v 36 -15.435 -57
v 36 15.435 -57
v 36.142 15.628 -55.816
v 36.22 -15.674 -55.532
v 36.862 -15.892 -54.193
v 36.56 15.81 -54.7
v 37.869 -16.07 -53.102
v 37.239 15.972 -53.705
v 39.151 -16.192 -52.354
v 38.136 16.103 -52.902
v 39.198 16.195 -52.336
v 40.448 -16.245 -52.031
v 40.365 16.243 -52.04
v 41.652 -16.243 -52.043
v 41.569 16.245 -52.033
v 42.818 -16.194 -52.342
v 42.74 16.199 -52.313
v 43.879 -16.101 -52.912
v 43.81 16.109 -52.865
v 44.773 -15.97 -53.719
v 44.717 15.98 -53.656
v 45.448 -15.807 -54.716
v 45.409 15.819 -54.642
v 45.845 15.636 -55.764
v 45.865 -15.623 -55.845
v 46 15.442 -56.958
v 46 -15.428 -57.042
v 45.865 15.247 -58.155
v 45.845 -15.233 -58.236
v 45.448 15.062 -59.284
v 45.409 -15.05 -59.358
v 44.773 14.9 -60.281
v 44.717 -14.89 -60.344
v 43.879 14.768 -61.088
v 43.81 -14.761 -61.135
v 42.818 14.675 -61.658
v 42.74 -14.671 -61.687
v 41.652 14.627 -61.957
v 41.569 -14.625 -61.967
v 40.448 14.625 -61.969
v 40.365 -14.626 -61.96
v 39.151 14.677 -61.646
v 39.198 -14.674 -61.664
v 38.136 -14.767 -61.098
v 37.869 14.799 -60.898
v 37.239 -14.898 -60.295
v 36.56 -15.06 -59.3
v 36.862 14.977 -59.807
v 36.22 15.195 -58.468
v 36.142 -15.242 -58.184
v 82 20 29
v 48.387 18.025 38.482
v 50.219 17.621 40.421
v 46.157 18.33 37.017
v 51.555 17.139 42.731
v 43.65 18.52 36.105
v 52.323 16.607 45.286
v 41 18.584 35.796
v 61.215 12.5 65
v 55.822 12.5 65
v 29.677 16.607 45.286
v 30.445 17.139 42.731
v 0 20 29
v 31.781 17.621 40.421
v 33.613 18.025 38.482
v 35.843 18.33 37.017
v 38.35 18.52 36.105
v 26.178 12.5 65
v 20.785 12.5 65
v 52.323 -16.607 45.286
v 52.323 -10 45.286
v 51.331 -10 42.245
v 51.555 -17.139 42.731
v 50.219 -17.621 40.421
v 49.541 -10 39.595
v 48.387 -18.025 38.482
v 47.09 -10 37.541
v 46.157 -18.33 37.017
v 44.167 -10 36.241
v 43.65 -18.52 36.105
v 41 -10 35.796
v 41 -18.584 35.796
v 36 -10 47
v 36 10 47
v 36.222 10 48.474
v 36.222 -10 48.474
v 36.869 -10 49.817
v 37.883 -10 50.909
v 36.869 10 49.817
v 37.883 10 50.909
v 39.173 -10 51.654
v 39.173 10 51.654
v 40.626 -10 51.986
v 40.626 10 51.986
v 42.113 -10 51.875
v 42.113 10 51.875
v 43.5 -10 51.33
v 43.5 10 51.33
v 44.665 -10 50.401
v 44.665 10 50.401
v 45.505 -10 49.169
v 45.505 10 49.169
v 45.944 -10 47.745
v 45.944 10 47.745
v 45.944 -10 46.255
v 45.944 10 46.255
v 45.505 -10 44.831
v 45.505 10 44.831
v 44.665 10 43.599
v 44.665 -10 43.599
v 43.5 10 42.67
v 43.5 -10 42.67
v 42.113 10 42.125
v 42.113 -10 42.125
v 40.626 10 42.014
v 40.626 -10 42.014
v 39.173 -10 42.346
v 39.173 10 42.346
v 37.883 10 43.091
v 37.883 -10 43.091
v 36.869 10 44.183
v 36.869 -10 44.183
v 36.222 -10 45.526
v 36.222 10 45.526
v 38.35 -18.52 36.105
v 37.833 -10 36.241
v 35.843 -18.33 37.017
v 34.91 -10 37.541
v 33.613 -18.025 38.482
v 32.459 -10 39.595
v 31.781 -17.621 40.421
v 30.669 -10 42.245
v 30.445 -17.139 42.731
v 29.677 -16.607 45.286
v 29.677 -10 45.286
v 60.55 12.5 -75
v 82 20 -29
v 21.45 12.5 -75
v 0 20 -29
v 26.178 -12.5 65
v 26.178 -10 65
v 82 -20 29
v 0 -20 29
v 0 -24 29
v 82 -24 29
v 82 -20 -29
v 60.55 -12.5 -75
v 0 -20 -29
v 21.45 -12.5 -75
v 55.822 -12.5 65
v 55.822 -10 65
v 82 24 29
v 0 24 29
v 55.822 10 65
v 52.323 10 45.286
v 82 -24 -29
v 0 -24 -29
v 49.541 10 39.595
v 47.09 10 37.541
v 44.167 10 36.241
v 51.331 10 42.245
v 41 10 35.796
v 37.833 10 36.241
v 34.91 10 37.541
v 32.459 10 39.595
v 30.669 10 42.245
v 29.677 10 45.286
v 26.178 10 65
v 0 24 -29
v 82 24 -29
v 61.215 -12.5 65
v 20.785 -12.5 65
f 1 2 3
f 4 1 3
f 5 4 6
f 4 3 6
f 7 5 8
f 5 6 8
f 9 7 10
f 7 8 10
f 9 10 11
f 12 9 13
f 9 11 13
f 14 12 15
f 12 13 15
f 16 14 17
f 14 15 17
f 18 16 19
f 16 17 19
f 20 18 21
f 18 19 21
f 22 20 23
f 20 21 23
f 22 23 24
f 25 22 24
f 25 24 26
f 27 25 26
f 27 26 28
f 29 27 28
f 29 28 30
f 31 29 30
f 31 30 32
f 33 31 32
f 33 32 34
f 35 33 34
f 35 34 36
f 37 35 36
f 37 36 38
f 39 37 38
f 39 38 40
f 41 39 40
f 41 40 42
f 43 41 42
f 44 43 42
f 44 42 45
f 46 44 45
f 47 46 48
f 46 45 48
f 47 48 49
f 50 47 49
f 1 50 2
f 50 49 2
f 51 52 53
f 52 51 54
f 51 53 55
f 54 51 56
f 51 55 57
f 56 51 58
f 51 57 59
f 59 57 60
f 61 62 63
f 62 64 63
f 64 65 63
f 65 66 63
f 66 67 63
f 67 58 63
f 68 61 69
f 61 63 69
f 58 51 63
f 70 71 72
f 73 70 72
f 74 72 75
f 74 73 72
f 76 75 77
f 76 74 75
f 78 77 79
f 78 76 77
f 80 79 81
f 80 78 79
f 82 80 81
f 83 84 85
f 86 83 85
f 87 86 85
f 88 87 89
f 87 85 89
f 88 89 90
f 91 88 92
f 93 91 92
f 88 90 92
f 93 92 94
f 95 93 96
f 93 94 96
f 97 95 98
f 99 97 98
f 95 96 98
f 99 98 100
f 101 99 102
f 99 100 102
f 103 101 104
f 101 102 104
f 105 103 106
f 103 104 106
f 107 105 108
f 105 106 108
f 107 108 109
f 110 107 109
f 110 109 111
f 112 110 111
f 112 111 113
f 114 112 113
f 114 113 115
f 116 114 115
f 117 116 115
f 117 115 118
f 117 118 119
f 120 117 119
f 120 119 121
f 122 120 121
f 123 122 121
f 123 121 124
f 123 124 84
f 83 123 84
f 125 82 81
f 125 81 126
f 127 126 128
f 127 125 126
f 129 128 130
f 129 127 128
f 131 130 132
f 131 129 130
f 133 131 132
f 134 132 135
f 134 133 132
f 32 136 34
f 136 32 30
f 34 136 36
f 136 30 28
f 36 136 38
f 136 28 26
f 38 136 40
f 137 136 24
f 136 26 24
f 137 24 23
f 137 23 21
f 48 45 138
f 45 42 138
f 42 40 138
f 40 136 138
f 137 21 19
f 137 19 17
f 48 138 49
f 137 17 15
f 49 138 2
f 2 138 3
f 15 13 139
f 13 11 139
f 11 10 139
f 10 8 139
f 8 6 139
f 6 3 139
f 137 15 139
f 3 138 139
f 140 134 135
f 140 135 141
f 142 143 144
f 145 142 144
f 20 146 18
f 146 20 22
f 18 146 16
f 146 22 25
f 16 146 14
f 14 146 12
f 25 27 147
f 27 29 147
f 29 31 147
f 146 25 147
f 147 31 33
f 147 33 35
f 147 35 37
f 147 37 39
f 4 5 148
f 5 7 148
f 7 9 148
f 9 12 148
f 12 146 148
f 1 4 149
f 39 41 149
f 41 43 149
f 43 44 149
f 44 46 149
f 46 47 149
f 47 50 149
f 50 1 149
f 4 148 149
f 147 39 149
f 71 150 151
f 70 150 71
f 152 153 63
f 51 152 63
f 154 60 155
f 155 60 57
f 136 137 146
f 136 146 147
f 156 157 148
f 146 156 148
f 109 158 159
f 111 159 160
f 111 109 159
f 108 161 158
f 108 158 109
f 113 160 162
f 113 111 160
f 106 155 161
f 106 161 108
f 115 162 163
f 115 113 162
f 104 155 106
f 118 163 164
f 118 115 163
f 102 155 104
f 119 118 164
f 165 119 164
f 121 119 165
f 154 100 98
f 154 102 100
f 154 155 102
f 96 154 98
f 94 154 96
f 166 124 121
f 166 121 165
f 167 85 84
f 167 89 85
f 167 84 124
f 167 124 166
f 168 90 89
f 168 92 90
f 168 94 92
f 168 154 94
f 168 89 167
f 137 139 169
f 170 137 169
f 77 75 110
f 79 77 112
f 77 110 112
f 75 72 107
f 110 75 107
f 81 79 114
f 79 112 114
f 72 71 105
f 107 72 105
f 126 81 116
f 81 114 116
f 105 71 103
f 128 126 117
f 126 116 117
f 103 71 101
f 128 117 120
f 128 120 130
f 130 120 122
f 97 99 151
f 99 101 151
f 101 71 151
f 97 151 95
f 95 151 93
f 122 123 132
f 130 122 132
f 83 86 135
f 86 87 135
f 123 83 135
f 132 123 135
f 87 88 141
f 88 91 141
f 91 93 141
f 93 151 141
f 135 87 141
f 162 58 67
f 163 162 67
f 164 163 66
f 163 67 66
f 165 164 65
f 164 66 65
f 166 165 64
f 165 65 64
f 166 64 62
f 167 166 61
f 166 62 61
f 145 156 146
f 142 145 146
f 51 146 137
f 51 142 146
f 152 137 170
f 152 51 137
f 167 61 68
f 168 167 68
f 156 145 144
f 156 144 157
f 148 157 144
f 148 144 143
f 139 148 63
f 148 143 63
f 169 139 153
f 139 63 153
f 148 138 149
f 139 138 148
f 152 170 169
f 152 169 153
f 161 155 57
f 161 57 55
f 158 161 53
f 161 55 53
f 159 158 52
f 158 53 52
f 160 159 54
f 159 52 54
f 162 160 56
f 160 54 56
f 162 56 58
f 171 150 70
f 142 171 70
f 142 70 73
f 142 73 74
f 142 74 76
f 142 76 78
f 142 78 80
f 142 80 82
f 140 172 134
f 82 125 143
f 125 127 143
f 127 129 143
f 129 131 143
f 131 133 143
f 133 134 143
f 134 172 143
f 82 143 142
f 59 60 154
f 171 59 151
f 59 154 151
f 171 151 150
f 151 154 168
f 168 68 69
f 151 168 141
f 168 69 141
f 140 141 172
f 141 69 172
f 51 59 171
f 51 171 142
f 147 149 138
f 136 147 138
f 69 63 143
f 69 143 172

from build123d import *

# Parameters (mm, degrees)
F1_DEPTH = 82
F2_R     = 5
F3_DEPTH = 48
F5_DEPTH = 14


# Not quite as in the source:
# - a pattern or mirror of a feature is missing from the dataset's text; its kind, count and spacing are read off the source's solid


with BuildPart() as f1:
    # F0 (on Right) → F1 (new body)
    with BuildSketch(Plane.YZ):
        Polygon((12.5, 65), (-12.5, 65), (-20, 29), (-24, 29), (-24, -29), (-20, -29), (-12.5, -75), (12.5, -75), (20, -29), (24, -29), (24, 29), (20, 29), align=None)
    extrude(amount=F1_DEPTH)

    # F2 (on face) → F3 (intersect, through all)
    with BuildSketch(Plane(origin=(0, 24, 0), x_dir=(-1, 0, 0), z_dir=(0, 1, 0))):
        Polygon((-26.5581123827, 75), (-55.4418876173, 75), (-92, 11.6794919243), (-92, -7.5549307949), (-55.8867711433, -85), (-26.1132288567, -85), (10, -7.5549307949), (10, 11.6794919243), align=None)
        with Locations((-41, -57)):
            Circle(F2_R, mode=Mode.SUBTRACT)
        with Locations((-41, 47)):
            Circle(F2_R, mode=Mode.SUBTRACT)
    extrude(amount=-F3_DEPTH, mode=Mode.INTERSECT)

    # F4 (on face) → F5 (cut)
    with BuildSketch(Plane(origin=(0, 24, 0), x_dir=(-1, 0, 0), z_dir=(0, 1, 0))):
        with BuildLine():
            ThreePointArc((-52.3229859469, 45.2858959478), (-48.3869925151, 38.4821097444), (-41, 35.7958683968))
            Line((-41, 35.7958683968), (-41, 66))
            Line((-41, 66), (-56, 66))
            Line((-56, 66), (-52.3229859469, 45.2858959478))
        make_face()
        with BuildLine():
            Line((-41, 66), (-41, 35.7958683968))
            ThreePointArc((-41, 35.7958683968), (-33.6130074849, 38.4821097444), (-29.6770140531, 45.2858959478))
            Line((-29.6770140531, 45.2858959478), (-26, 66))
            Line((-26, 66), (-41, 66))
        make_face()
    f5 = extrude(amount=-F5_DEPTH, mode=Mode.SUBTRACT)

    # F5_copies: F5 across plane
    add(f5.mirror(Plane(origin=(0, 0, 0), x_dir=(0, 0, -1), z_dir=(0, -1, 0))), mode=Mode.SUBTRACT)


solid = f1.part
